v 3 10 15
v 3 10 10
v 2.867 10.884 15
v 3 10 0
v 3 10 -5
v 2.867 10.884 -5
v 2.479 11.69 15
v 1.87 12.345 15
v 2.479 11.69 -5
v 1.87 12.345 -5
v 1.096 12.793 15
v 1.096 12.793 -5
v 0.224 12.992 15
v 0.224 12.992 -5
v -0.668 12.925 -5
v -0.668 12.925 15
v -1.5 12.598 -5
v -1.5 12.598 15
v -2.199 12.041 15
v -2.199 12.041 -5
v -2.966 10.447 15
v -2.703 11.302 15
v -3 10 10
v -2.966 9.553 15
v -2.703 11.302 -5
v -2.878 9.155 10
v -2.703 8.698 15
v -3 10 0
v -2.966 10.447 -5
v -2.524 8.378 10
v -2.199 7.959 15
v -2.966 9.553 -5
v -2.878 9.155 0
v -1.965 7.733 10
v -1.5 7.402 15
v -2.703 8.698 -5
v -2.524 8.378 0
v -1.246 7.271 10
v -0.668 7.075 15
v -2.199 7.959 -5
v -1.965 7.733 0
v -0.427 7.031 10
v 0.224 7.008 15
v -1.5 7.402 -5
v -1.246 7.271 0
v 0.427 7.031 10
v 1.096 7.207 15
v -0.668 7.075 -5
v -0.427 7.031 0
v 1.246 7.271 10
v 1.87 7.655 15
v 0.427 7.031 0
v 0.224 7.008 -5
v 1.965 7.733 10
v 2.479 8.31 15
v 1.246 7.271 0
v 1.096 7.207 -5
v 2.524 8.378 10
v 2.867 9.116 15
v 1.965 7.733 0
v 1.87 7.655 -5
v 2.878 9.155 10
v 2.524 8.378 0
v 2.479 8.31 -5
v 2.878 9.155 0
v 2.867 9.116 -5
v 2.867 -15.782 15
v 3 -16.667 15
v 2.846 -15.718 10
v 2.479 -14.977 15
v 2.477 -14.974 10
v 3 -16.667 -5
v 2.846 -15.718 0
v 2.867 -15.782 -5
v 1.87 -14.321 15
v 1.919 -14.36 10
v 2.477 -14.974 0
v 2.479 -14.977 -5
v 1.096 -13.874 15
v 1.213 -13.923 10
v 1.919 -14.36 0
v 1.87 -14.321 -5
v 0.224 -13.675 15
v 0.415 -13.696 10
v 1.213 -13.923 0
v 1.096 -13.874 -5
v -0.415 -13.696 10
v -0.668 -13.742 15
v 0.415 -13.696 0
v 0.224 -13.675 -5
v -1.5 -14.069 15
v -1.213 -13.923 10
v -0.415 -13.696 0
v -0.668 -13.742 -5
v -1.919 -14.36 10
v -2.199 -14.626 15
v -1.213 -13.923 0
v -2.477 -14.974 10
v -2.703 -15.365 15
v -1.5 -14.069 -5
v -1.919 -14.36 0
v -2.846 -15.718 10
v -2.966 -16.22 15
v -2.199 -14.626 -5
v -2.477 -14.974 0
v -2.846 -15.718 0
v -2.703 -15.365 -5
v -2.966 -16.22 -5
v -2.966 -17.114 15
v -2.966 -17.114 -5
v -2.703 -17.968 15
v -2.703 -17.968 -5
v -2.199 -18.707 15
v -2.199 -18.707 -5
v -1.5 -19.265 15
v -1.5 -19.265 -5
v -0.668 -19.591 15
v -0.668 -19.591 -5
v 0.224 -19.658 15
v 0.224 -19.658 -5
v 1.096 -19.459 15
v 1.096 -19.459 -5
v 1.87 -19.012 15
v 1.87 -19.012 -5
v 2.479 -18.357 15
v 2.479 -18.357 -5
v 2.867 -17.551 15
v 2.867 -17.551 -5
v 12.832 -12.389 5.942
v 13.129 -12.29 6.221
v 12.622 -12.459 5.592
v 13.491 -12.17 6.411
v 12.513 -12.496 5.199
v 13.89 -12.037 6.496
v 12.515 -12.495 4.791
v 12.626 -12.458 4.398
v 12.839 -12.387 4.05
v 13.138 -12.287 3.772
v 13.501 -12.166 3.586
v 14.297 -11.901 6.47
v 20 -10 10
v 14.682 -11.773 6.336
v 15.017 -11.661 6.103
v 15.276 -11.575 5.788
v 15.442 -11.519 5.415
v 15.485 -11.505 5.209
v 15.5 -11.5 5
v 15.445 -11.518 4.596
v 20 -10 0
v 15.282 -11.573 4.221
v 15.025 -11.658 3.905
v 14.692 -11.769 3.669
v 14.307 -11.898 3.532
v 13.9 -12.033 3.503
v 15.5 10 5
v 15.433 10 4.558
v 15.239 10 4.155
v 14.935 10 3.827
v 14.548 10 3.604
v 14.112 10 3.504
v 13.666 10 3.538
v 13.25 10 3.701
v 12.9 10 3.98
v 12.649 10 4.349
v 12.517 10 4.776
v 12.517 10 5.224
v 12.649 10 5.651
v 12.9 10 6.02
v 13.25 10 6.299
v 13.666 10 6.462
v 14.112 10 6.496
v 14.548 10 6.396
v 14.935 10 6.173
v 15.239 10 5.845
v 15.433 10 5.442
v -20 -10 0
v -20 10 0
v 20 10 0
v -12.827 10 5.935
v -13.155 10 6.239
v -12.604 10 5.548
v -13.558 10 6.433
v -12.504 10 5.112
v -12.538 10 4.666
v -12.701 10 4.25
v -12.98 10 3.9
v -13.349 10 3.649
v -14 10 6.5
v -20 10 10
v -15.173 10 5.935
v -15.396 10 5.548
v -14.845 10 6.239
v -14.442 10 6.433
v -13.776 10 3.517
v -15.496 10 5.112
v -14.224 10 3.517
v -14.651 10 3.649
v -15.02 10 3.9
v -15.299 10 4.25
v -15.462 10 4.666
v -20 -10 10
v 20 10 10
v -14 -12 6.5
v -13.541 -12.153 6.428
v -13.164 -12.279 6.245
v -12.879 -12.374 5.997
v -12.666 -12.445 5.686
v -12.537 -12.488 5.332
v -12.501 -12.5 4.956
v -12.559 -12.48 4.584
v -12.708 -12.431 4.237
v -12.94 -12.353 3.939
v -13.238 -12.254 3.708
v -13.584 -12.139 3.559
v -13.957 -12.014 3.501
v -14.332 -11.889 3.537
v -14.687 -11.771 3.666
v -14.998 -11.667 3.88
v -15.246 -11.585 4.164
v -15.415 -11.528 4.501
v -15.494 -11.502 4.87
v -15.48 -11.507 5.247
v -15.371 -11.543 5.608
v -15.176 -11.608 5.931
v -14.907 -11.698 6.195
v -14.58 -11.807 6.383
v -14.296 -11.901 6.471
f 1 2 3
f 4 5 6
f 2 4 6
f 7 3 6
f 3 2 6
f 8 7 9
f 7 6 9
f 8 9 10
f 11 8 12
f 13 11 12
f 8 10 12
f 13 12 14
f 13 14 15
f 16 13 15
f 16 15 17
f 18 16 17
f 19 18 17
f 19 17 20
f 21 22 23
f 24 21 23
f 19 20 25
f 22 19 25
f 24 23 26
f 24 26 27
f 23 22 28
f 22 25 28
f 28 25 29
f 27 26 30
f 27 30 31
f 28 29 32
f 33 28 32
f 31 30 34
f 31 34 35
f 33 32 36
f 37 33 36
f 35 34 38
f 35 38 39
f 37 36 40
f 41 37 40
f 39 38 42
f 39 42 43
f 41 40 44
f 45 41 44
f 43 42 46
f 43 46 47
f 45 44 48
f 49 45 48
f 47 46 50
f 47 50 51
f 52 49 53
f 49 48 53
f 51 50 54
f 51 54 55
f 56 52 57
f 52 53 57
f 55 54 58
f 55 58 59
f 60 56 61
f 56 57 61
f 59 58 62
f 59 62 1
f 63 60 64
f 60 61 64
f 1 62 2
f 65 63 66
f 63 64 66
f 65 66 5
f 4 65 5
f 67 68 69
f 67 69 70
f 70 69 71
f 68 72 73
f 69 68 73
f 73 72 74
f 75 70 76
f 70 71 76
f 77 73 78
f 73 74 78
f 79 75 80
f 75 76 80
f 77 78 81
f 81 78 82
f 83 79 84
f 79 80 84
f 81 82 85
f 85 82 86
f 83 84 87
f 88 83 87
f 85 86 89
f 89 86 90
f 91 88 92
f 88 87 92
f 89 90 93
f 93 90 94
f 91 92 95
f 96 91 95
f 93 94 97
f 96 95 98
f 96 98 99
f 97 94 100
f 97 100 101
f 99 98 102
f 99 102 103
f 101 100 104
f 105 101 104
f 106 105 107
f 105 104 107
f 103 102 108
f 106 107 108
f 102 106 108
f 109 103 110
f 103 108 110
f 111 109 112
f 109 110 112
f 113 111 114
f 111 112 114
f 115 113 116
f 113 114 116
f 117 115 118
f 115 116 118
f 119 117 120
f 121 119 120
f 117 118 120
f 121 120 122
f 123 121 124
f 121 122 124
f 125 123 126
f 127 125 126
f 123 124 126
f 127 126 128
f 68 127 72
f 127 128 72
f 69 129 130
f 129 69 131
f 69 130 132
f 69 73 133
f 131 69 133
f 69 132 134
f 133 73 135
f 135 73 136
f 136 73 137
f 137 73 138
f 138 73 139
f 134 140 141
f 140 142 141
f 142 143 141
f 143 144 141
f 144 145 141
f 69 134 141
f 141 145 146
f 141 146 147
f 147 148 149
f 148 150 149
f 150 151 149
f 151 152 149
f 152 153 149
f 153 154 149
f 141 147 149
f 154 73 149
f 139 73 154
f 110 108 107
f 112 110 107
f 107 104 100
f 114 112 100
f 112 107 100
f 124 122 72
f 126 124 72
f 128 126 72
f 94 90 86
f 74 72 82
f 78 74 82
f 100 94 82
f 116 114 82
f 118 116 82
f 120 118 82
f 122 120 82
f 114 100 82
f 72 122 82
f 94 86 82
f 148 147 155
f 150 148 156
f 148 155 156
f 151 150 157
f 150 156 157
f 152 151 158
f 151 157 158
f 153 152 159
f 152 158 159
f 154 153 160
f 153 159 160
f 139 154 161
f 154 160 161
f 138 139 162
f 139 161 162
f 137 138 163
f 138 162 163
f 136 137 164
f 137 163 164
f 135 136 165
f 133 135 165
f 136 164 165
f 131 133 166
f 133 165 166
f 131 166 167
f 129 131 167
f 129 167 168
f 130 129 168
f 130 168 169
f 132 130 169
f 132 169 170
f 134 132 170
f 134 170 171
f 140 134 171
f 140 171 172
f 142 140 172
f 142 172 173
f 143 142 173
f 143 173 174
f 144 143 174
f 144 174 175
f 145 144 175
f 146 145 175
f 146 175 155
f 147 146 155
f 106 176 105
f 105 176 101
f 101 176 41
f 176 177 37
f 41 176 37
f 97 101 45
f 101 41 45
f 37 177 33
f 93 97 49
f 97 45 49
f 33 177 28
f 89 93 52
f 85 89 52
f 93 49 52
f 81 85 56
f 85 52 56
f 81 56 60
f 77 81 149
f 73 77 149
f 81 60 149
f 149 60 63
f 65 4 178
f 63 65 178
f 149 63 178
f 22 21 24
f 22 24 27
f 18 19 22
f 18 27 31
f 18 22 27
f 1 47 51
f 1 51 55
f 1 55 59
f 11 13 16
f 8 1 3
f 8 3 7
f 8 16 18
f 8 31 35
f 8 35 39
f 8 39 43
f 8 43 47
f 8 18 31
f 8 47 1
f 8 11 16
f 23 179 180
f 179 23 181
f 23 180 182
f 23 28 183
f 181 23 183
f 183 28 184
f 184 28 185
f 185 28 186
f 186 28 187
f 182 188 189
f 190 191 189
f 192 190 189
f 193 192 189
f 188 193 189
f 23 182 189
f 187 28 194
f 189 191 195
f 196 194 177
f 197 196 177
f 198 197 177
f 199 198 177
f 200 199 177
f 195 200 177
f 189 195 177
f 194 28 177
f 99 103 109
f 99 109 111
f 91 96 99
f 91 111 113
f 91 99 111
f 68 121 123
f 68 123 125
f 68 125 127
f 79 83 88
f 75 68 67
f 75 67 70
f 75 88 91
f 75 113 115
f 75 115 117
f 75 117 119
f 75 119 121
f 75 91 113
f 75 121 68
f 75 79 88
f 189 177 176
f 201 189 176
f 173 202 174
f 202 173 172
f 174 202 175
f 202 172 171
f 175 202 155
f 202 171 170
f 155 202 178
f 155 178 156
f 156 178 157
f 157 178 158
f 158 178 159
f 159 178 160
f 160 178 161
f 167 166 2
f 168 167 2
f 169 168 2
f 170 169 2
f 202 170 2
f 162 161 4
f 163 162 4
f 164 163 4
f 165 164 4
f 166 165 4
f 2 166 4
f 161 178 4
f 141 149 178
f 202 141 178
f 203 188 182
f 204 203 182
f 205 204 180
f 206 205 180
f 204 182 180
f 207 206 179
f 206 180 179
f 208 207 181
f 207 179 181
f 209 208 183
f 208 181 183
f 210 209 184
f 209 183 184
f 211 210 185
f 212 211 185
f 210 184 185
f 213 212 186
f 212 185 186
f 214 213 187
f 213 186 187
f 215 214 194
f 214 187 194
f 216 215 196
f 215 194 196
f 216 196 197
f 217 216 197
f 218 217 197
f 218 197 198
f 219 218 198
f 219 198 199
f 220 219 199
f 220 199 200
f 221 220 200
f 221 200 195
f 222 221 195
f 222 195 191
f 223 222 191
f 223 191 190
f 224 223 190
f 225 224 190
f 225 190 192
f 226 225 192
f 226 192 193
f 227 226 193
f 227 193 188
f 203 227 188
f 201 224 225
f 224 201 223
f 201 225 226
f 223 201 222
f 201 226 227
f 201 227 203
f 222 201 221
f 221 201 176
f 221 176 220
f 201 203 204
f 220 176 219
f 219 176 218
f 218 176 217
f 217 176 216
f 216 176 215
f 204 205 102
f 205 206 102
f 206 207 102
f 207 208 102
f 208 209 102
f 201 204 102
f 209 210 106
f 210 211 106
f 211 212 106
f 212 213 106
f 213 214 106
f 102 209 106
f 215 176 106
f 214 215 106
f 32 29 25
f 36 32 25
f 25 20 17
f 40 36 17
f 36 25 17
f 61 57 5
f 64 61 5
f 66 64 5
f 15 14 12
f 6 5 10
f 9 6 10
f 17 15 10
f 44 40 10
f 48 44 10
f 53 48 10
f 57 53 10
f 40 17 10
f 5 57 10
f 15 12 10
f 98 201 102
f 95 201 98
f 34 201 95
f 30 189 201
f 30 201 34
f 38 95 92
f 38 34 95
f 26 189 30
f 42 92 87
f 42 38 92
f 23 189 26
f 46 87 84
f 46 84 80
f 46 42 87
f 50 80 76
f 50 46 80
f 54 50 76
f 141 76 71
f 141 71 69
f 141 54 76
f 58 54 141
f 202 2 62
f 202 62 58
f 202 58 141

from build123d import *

# Parameters (mm, degrees)
BOSS_EXTRUDE1_DEPTH      = 10
BOSS_EXTRUDE2_DEPTH      = 15
BOSS_EXTRUDE2_DEPTH_BACK = 5
SKETCH2_R                = 1.5
CUT_EXTRUDE1_DEPTH       = 39.79576151
BOSS_EXTRUDE3_DEPTH      = 5
BOSS_EXTRUDE3_DEPTH_BACK = 15
SKETCH3_R                = 3


with BuildPart() as part:
    # Sketch1 → Boss-Extrude1 (new body)
    with BuildSketch(Plane.XY):
        with BuildLine():
            Line((-20, 10), (-20, -10))
            Line((-20, -10), (-2.846049894, -15.717983369))
            ThreePointArc((-2.846049894, -15.717983369), (0, -13.666666667), (2.846049894, -15.717983369))
            Line((2.846049894, -15.717983369), (20, -10))
            Line((20, -10), (20, 10))
            Line((20, 10), (-20, 10))
        make_face()
    extrude(amount=BOSS_EXTRUDE1_DEPTH)

    # Sketch1<3> → Boss-Extrude2 (add, two sides: drawn at the far end of the back side and taken through both)
    with BuildSketch(Plane.XY.offset(-BOSS_EXTRUDE2_DEPTH_BACK)):
        with BuildLine():
            ThreePointArc((2.846049894, -15.717983369), (0, -13.666666667), (-2.846049894, -15.717983369))
            ThreePointArc((-2.846049894, -15.717983369), (-0.480546729, -19.62792904), (3, -16.666666667))
            ThreePointArc((3, -16.666666667), (2.961262373, -16.186119938), (2.846049894, -15.717983369))
        make_face()
    extrude(amount=BOSS_EXTRUDE2_DEPTH + BOSS_EXTRUDE2_DEPTH_BACK)

    # Sketch2 → Cut-Extrude1 (cut, through all)
    with BuildSketch(Plane(origin=(0, 10, 0), x_dir=(1, 0, 0), z_dir=(0, 1, 0))):
        with Locations((-14, -5)):
            Circle(SKETCH2_R)
        with Locations((14, -5)):
            Circle(SKETCH2_R)
    extrude(amount=-CUT_EXTRUDE1_DEPTH, mode=Mode.SUBTRACT)

    # Sketch3 → Boss-Extrude3 (add, two sides: drawn at the far end of the back side and taken through both)
    with BuildSketch(Plane.XY.offset(10).offset(-BOSS_EXTRUDE3_DEPTH_BACK)):
        with Locations((0, 10)):
            Circle(SKETCH3_R)
    extrude(amount=BOSS_EXTRUDE3_DEPTH + BOSS_EXTRUDE3_DEPTH_BACK)


solid = part.part
